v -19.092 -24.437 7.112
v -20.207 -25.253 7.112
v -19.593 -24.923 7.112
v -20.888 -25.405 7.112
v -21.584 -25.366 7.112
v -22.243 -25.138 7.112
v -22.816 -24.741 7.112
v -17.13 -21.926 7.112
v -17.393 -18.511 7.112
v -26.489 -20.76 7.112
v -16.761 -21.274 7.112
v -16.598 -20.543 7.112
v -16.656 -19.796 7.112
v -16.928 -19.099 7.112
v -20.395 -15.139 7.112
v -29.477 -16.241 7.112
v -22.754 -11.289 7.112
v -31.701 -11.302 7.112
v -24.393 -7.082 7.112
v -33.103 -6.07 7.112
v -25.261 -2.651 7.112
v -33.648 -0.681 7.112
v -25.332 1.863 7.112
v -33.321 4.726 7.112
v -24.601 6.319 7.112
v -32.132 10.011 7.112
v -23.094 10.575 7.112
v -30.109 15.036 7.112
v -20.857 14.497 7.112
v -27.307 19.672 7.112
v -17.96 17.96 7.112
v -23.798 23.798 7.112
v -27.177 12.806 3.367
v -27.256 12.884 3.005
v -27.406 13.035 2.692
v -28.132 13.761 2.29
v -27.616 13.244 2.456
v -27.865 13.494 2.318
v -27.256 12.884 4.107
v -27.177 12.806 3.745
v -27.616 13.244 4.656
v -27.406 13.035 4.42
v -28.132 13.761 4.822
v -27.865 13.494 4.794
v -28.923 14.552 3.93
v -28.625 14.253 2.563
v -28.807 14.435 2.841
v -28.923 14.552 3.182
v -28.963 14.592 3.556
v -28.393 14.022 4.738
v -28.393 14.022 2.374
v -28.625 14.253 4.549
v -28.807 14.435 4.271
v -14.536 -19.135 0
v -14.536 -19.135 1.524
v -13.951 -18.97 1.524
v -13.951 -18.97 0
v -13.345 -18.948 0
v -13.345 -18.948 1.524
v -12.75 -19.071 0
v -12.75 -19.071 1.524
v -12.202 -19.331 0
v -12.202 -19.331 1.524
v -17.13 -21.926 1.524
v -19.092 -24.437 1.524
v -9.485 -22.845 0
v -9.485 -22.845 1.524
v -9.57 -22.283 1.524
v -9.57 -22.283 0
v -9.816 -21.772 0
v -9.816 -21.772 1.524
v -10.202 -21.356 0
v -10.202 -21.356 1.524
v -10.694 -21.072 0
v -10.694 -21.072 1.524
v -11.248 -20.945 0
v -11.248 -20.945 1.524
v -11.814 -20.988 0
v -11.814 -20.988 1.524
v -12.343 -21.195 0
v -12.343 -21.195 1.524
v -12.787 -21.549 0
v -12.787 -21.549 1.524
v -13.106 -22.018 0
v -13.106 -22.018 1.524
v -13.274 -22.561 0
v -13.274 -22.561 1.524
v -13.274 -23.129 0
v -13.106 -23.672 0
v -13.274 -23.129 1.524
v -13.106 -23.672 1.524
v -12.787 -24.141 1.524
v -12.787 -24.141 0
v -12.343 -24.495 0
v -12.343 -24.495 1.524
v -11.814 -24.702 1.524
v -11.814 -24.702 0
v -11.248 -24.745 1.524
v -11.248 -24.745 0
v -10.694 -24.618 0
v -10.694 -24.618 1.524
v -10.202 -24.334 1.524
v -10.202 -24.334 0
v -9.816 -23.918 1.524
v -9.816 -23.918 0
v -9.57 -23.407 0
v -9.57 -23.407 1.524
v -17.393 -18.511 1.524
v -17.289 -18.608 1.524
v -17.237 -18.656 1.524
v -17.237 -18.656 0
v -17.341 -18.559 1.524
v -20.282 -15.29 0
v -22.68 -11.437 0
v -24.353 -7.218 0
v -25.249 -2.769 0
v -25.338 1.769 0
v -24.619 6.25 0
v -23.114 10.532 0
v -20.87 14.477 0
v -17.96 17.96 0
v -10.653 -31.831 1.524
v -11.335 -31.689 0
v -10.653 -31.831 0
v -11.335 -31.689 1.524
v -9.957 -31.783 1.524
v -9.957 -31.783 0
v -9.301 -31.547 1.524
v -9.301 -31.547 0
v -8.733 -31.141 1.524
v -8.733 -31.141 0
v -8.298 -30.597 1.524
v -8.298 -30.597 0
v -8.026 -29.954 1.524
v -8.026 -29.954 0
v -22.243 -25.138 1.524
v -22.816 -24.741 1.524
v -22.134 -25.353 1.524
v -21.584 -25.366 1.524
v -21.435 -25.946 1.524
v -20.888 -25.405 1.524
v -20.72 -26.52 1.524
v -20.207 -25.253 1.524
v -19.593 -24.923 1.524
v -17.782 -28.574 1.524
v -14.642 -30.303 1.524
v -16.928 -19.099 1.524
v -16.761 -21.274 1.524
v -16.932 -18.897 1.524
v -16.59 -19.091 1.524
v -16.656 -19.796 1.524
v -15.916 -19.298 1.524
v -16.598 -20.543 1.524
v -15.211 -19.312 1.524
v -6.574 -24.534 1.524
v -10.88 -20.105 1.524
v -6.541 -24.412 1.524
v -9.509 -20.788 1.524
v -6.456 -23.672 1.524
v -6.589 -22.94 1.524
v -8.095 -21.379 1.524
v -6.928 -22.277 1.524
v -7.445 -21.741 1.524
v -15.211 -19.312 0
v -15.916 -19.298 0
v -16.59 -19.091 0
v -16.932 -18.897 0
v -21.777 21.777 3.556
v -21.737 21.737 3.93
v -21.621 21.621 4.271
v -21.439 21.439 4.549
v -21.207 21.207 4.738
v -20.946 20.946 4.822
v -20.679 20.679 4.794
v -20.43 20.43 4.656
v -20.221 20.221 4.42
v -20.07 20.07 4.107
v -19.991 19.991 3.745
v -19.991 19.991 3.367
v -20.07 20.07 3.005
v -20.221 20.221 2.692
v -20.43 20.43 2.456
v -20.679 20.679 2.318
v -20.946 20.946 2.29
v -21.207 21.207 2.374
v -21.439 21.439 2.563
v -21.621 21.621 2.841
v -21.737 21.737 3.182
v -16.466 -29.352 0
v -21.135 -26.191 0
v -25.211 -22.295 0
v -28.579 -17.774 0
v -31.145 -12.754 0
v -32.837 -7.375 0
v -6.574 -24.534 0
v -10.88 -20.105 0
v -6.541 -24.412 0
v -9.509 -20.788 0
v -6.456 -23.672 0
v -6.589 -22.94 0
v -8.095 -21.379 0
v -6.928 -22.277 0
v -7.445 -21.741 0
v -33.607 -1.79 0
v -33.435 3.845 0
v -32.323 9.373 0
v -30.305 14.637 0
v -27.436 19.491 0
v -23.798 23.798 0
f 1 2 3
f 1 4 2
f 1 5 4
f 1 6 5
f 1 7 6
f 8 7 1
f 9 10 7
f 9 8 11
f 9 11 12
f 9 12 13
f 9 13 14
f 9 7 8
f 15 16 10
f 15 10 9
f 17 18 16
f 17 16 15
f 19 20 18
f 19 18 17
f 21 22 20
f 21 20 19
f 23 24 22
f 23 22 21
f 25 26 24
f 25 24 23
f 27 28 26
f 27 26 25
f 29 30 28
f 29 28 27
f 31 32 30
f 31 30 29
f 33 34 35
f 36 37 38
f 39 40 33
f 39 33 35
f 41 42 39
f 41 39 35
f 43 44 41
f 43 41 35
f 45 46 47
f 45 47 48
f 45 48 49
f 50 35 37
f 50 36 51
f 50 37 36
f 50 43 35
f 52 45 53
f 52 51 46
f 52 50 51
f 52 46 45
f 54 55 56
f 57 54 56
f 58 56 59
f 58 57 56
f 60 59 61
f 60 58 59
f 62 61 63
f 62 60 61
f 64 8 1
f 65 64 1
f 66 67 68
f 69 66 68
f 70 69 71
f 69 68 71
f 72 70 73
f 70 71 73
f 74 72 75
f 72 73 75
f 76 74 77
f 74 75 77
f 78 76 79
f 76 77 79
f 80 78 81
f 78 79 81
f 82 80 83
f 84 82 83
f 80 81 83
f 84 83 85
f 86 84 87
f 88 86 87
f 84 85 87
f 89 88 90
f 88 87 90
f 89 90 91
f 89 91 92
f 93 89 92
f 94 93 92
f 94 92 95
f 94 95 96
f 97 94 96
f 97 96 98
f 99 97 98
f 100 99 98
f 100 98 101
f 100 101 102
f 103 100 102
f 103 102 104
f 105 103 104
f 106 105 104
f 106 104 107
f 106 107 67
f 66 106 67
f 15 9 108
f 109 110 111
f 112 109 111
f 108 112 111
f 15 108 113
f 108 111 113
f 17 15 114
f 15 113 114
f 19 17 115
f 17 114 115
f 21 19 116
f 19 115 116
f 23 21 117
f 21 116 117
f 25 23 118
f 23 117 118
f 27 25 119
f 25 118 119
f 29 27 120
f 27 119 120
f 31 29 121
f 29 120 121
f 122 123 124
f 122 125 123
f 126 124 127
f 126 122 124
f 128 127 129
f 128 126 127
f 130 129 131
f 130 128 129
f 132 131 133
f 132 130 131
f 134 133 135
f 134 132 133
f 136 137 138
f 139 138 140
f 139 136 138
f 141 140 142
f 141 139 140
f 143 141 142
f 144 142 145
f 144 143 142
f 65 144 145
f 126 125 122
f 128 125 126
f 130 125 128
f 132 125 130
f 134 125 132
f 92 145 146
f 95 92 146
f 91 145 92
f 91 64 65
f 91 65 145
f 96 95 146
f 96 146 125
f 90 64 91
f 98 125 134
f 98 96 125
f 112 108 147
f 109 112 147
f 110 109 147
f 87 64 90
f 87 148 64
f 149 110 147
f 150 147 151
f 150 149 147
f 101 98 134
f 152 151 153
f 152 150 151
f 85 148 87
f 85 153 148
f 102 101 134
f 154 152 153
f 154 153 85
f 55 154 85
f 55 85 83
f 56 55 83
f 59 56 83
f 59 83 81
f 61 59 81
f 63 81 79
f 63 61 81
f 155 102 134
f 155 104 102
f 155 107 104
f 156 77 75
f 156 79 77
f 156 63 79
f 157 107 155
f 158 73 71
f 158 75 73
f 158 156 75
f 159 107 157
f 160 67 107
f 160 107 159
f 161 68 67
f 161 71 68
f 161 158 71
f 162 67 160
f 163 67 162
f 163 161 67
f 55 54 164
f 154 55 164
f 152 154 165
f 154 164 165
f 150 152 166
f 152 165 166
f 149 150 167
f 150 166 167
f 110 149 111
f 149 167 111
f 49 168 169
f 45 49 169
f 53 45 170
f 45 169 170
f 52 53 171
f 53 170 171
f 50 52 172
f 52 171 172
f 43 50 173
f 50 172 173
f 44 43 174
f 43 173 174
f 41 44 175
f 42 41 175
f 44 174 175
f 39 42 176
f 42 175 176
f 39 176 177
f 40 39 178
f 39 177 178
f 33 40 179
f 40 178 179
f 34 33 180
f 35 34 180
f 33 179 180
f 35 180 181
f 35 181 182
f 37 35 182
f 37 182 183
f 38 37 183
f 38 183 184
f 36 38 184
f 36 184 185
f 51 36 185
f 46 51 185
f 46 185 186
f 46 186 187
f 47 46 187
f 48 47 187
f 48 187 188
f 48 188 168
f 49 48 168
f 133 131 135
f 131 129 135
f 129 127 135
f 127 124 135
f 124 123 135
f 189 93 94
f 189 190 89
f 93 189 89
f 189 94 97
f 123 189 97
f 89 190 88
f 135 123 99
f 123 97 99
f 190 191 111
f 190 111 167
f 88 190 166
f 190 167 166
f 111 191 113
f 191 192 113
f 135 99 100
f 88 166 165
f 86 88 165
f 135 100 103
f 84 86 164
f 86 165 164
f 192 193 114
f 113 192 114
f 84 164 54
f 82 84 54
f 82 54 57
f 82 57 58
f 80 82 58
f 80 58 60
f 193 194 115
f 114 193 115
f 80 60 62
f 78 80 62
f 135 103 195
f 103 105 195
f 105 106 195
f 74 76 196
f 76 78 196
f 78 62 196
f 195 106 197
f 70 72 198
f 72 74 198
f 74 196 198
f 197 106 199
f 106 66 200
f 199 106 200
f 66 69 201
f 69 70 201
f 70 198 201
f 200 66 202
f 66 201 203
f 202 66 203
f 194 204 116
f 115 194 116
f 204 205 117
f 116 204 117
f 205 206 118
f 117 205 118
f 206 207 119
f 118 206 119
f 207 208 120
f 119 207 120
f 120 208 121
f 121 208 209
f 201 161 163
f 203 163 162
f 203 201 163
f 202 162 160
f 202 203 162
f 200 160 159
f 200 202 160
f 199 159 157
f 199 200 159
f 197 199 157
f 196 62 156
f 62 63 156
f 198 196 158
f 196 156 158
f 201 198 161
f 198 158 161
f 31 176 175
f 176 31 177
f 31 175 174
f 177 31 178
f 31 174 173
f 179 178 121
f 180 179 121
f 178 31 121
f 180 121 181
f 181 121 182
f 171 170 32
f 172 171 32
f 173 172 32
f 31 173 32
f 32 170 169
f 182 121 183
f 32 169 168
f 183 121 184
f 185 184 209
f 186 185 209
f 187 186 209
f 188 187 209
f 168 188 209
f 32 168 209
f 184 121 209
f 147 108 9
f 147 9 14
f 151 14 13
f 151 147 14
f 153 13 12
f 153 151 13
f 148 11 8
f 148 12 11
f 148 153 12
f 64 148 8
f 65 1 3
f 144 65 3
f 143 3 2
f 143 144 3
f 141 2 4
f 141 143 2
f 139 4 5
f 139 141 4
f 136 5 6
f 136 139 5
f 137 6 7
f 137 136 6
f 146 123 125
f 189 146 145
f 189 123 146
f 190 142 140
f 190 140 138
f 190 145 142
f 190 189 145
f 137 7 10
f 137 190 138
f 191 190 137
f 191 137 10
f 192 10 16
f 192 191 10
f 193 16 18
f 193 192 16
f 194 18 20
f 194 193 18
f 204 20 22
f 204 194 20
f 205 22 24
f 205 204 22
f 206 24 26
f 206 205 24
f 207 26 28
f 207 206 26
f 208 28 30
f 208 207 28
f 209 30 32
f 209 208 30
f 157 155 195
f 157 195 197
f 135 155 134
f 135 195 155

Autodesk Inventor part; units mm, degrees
ref_plane "YZ Plane" through (0, 0, 0) normal (1, 0, 0) x (0, 1, 0)
ref_plane "XZ Plane" through (0, 0, 0) normal (0, 1, 0) x (-1, 0, 0)
ref_plane "XY Plane" through (0, 0, 0) normal (0, 0, 1) x (1, 0, 0)
sketch "Sketch1" plane through (0, 0, 0) normal (0, 0, 1) x (1, 0, 0)
  circle A0 centre (0, 0) radius 25.4
  circle A1 centre (0, 0) radius 33.655
  line L0 (-17.9605, 17.9605) -> (-23.7977, 23.7977)
  line L1 (17.9605, 17.9605) -> (23.7977, 23.7977)
  line L2 (-23.7977, 23.7977) -> (-23.7977, 0) construction
  line L3 (23.7977, 23.7977) -> (23.7977, 0) construction
  line L4 (-6.574, -24.5345) -> (-8.7106, -32.5082)
  line L5 (6.574, -24.5345) -> (8.7106, -32.5082)
  line L6 (-6.574, -24.5345) -> (-6.574, 0) construction
  line L7 (6.574, -24.5345) -> (6.574, 0) construction
  dimension "d0" = 50.8
  dimension "d1" = 67.31
  dimension "d2" = 90
  dimension "d3" = 30
extrude "Extrusion1" add sketch "Sketch1" along normal blind 7.112 contours A0 L4 A1 L0
sketch "Sketch2" plane through (-23.7977, 23.7977, 0) normal (0.7071, 0.7071, 0) x (-0.7071, 0.7071, 0)
  line L0 (-8.255, 0) -> (0, 0) construction
  line L1 (0, 0) -> (0, 7.112) construction
  line L2 (-8.255, 7.112) -> (0, 7.112) construction
  line L3 (-8.255, 0) -> (-8.255, 7.112) construction
  circle A0 centre (-4.1275, 3.556) radius 1.27
  point P0 (-33.655, 0)
  dimension "d6" = 2.54
extrude "Extrusion2" cut sketch "Sketch2" against normal blind 10.16
sketch "Sketch3" plane through (0, 0, 7.112) normal (0, 0, 1) x (1, 0, 0)
  line L0 (-17.9605, 17.9605) -> (-23.7977, 23.7977) projected
  arc A0 (-23.7977, 23.7977) -> (-8.7106, -32.5082) centre (0, 0) ccw projected
  line L1 (-8.7106, -32.5082) -> (-6.574, -24.5345) projected
  arc A1 (-17.9605, 17.9605) -> (-6.574, -24.5345) centre (0, 0) ccw projected
  line L2 (-15.6378, -20.0155) -> (-20.7201, -26.5205)
  dimension "d9" = 23
extrude "Extrusion3" cut sketch "Sketch3" against normal blind 5.588 contours A1 L1 A0 L2
sketch "Sketch5" plane through (0, 0, 1.524) normal (0, 0, 1) x (1, 0, 0)
  line L0 (-6.574, -24.5345) -> (-8.7106, -32.5082) projected
  arc A0 (-15.6378, -20.0155) -> (-6.574, -24.5345) centre (0, 0) ccw projected
  line L1 (-20.7201, -26.5205) -> (-15.6378, -20.0155) projected
  arc A1 (-20.7201, -26.5205) -> (-8.7106, -32.5082) centre (0, 0) ccw projected
  line L2 (-6.574, -24.5345) -> (-5.9166, -22.0811)
  line L3 (-15.6378, -20.0155) -> (-14.074, -18.0139)
  arc A2 (-14.074, -18.0139) -> (-5.9166, -22.0811) centre (0, 0) ccw
  line L4 (-6.574, -24.5345) -> (-8.7106, -32.5082) projected
  line L5 (-20.7201, -26.5205) -> (-15.6378, -20.0155) projected
  dimension "d18" = 2.54
extrude "Extrusion5" add sketch "Sketch5" against normal up to surface (1.524 mm away)
sketch "Sketch6" plane through (0, 0, 1.524) normal (0, 0, 1) x (1, 0, 0)
  circle A0 centre (-11.3901, -22.845) radius 1.905
  line L0 (0, 0) -> (0, -28.075) construction
  dimension "d21" = 3.81
  dimension "d22" = 25.527
  dimension "d23" = 26.5
extrude "Extrusion6" cut sketch "Sketch6" against normal blind 25.4
fillet "Fillet1" radius 2.54 6 edges at (-20.7201, -26.5205, 4.318) (-15.6378, -20.0155, 4.318) (-14.074, -18.0139, 0.762) (-15.6378, -20.0155, 0.762) (-5.9166, -22.0811, 0.762) (-8.7106, -32.5082, 0.762)
properties part number "BearingMount1" material "ABS Plastic"
